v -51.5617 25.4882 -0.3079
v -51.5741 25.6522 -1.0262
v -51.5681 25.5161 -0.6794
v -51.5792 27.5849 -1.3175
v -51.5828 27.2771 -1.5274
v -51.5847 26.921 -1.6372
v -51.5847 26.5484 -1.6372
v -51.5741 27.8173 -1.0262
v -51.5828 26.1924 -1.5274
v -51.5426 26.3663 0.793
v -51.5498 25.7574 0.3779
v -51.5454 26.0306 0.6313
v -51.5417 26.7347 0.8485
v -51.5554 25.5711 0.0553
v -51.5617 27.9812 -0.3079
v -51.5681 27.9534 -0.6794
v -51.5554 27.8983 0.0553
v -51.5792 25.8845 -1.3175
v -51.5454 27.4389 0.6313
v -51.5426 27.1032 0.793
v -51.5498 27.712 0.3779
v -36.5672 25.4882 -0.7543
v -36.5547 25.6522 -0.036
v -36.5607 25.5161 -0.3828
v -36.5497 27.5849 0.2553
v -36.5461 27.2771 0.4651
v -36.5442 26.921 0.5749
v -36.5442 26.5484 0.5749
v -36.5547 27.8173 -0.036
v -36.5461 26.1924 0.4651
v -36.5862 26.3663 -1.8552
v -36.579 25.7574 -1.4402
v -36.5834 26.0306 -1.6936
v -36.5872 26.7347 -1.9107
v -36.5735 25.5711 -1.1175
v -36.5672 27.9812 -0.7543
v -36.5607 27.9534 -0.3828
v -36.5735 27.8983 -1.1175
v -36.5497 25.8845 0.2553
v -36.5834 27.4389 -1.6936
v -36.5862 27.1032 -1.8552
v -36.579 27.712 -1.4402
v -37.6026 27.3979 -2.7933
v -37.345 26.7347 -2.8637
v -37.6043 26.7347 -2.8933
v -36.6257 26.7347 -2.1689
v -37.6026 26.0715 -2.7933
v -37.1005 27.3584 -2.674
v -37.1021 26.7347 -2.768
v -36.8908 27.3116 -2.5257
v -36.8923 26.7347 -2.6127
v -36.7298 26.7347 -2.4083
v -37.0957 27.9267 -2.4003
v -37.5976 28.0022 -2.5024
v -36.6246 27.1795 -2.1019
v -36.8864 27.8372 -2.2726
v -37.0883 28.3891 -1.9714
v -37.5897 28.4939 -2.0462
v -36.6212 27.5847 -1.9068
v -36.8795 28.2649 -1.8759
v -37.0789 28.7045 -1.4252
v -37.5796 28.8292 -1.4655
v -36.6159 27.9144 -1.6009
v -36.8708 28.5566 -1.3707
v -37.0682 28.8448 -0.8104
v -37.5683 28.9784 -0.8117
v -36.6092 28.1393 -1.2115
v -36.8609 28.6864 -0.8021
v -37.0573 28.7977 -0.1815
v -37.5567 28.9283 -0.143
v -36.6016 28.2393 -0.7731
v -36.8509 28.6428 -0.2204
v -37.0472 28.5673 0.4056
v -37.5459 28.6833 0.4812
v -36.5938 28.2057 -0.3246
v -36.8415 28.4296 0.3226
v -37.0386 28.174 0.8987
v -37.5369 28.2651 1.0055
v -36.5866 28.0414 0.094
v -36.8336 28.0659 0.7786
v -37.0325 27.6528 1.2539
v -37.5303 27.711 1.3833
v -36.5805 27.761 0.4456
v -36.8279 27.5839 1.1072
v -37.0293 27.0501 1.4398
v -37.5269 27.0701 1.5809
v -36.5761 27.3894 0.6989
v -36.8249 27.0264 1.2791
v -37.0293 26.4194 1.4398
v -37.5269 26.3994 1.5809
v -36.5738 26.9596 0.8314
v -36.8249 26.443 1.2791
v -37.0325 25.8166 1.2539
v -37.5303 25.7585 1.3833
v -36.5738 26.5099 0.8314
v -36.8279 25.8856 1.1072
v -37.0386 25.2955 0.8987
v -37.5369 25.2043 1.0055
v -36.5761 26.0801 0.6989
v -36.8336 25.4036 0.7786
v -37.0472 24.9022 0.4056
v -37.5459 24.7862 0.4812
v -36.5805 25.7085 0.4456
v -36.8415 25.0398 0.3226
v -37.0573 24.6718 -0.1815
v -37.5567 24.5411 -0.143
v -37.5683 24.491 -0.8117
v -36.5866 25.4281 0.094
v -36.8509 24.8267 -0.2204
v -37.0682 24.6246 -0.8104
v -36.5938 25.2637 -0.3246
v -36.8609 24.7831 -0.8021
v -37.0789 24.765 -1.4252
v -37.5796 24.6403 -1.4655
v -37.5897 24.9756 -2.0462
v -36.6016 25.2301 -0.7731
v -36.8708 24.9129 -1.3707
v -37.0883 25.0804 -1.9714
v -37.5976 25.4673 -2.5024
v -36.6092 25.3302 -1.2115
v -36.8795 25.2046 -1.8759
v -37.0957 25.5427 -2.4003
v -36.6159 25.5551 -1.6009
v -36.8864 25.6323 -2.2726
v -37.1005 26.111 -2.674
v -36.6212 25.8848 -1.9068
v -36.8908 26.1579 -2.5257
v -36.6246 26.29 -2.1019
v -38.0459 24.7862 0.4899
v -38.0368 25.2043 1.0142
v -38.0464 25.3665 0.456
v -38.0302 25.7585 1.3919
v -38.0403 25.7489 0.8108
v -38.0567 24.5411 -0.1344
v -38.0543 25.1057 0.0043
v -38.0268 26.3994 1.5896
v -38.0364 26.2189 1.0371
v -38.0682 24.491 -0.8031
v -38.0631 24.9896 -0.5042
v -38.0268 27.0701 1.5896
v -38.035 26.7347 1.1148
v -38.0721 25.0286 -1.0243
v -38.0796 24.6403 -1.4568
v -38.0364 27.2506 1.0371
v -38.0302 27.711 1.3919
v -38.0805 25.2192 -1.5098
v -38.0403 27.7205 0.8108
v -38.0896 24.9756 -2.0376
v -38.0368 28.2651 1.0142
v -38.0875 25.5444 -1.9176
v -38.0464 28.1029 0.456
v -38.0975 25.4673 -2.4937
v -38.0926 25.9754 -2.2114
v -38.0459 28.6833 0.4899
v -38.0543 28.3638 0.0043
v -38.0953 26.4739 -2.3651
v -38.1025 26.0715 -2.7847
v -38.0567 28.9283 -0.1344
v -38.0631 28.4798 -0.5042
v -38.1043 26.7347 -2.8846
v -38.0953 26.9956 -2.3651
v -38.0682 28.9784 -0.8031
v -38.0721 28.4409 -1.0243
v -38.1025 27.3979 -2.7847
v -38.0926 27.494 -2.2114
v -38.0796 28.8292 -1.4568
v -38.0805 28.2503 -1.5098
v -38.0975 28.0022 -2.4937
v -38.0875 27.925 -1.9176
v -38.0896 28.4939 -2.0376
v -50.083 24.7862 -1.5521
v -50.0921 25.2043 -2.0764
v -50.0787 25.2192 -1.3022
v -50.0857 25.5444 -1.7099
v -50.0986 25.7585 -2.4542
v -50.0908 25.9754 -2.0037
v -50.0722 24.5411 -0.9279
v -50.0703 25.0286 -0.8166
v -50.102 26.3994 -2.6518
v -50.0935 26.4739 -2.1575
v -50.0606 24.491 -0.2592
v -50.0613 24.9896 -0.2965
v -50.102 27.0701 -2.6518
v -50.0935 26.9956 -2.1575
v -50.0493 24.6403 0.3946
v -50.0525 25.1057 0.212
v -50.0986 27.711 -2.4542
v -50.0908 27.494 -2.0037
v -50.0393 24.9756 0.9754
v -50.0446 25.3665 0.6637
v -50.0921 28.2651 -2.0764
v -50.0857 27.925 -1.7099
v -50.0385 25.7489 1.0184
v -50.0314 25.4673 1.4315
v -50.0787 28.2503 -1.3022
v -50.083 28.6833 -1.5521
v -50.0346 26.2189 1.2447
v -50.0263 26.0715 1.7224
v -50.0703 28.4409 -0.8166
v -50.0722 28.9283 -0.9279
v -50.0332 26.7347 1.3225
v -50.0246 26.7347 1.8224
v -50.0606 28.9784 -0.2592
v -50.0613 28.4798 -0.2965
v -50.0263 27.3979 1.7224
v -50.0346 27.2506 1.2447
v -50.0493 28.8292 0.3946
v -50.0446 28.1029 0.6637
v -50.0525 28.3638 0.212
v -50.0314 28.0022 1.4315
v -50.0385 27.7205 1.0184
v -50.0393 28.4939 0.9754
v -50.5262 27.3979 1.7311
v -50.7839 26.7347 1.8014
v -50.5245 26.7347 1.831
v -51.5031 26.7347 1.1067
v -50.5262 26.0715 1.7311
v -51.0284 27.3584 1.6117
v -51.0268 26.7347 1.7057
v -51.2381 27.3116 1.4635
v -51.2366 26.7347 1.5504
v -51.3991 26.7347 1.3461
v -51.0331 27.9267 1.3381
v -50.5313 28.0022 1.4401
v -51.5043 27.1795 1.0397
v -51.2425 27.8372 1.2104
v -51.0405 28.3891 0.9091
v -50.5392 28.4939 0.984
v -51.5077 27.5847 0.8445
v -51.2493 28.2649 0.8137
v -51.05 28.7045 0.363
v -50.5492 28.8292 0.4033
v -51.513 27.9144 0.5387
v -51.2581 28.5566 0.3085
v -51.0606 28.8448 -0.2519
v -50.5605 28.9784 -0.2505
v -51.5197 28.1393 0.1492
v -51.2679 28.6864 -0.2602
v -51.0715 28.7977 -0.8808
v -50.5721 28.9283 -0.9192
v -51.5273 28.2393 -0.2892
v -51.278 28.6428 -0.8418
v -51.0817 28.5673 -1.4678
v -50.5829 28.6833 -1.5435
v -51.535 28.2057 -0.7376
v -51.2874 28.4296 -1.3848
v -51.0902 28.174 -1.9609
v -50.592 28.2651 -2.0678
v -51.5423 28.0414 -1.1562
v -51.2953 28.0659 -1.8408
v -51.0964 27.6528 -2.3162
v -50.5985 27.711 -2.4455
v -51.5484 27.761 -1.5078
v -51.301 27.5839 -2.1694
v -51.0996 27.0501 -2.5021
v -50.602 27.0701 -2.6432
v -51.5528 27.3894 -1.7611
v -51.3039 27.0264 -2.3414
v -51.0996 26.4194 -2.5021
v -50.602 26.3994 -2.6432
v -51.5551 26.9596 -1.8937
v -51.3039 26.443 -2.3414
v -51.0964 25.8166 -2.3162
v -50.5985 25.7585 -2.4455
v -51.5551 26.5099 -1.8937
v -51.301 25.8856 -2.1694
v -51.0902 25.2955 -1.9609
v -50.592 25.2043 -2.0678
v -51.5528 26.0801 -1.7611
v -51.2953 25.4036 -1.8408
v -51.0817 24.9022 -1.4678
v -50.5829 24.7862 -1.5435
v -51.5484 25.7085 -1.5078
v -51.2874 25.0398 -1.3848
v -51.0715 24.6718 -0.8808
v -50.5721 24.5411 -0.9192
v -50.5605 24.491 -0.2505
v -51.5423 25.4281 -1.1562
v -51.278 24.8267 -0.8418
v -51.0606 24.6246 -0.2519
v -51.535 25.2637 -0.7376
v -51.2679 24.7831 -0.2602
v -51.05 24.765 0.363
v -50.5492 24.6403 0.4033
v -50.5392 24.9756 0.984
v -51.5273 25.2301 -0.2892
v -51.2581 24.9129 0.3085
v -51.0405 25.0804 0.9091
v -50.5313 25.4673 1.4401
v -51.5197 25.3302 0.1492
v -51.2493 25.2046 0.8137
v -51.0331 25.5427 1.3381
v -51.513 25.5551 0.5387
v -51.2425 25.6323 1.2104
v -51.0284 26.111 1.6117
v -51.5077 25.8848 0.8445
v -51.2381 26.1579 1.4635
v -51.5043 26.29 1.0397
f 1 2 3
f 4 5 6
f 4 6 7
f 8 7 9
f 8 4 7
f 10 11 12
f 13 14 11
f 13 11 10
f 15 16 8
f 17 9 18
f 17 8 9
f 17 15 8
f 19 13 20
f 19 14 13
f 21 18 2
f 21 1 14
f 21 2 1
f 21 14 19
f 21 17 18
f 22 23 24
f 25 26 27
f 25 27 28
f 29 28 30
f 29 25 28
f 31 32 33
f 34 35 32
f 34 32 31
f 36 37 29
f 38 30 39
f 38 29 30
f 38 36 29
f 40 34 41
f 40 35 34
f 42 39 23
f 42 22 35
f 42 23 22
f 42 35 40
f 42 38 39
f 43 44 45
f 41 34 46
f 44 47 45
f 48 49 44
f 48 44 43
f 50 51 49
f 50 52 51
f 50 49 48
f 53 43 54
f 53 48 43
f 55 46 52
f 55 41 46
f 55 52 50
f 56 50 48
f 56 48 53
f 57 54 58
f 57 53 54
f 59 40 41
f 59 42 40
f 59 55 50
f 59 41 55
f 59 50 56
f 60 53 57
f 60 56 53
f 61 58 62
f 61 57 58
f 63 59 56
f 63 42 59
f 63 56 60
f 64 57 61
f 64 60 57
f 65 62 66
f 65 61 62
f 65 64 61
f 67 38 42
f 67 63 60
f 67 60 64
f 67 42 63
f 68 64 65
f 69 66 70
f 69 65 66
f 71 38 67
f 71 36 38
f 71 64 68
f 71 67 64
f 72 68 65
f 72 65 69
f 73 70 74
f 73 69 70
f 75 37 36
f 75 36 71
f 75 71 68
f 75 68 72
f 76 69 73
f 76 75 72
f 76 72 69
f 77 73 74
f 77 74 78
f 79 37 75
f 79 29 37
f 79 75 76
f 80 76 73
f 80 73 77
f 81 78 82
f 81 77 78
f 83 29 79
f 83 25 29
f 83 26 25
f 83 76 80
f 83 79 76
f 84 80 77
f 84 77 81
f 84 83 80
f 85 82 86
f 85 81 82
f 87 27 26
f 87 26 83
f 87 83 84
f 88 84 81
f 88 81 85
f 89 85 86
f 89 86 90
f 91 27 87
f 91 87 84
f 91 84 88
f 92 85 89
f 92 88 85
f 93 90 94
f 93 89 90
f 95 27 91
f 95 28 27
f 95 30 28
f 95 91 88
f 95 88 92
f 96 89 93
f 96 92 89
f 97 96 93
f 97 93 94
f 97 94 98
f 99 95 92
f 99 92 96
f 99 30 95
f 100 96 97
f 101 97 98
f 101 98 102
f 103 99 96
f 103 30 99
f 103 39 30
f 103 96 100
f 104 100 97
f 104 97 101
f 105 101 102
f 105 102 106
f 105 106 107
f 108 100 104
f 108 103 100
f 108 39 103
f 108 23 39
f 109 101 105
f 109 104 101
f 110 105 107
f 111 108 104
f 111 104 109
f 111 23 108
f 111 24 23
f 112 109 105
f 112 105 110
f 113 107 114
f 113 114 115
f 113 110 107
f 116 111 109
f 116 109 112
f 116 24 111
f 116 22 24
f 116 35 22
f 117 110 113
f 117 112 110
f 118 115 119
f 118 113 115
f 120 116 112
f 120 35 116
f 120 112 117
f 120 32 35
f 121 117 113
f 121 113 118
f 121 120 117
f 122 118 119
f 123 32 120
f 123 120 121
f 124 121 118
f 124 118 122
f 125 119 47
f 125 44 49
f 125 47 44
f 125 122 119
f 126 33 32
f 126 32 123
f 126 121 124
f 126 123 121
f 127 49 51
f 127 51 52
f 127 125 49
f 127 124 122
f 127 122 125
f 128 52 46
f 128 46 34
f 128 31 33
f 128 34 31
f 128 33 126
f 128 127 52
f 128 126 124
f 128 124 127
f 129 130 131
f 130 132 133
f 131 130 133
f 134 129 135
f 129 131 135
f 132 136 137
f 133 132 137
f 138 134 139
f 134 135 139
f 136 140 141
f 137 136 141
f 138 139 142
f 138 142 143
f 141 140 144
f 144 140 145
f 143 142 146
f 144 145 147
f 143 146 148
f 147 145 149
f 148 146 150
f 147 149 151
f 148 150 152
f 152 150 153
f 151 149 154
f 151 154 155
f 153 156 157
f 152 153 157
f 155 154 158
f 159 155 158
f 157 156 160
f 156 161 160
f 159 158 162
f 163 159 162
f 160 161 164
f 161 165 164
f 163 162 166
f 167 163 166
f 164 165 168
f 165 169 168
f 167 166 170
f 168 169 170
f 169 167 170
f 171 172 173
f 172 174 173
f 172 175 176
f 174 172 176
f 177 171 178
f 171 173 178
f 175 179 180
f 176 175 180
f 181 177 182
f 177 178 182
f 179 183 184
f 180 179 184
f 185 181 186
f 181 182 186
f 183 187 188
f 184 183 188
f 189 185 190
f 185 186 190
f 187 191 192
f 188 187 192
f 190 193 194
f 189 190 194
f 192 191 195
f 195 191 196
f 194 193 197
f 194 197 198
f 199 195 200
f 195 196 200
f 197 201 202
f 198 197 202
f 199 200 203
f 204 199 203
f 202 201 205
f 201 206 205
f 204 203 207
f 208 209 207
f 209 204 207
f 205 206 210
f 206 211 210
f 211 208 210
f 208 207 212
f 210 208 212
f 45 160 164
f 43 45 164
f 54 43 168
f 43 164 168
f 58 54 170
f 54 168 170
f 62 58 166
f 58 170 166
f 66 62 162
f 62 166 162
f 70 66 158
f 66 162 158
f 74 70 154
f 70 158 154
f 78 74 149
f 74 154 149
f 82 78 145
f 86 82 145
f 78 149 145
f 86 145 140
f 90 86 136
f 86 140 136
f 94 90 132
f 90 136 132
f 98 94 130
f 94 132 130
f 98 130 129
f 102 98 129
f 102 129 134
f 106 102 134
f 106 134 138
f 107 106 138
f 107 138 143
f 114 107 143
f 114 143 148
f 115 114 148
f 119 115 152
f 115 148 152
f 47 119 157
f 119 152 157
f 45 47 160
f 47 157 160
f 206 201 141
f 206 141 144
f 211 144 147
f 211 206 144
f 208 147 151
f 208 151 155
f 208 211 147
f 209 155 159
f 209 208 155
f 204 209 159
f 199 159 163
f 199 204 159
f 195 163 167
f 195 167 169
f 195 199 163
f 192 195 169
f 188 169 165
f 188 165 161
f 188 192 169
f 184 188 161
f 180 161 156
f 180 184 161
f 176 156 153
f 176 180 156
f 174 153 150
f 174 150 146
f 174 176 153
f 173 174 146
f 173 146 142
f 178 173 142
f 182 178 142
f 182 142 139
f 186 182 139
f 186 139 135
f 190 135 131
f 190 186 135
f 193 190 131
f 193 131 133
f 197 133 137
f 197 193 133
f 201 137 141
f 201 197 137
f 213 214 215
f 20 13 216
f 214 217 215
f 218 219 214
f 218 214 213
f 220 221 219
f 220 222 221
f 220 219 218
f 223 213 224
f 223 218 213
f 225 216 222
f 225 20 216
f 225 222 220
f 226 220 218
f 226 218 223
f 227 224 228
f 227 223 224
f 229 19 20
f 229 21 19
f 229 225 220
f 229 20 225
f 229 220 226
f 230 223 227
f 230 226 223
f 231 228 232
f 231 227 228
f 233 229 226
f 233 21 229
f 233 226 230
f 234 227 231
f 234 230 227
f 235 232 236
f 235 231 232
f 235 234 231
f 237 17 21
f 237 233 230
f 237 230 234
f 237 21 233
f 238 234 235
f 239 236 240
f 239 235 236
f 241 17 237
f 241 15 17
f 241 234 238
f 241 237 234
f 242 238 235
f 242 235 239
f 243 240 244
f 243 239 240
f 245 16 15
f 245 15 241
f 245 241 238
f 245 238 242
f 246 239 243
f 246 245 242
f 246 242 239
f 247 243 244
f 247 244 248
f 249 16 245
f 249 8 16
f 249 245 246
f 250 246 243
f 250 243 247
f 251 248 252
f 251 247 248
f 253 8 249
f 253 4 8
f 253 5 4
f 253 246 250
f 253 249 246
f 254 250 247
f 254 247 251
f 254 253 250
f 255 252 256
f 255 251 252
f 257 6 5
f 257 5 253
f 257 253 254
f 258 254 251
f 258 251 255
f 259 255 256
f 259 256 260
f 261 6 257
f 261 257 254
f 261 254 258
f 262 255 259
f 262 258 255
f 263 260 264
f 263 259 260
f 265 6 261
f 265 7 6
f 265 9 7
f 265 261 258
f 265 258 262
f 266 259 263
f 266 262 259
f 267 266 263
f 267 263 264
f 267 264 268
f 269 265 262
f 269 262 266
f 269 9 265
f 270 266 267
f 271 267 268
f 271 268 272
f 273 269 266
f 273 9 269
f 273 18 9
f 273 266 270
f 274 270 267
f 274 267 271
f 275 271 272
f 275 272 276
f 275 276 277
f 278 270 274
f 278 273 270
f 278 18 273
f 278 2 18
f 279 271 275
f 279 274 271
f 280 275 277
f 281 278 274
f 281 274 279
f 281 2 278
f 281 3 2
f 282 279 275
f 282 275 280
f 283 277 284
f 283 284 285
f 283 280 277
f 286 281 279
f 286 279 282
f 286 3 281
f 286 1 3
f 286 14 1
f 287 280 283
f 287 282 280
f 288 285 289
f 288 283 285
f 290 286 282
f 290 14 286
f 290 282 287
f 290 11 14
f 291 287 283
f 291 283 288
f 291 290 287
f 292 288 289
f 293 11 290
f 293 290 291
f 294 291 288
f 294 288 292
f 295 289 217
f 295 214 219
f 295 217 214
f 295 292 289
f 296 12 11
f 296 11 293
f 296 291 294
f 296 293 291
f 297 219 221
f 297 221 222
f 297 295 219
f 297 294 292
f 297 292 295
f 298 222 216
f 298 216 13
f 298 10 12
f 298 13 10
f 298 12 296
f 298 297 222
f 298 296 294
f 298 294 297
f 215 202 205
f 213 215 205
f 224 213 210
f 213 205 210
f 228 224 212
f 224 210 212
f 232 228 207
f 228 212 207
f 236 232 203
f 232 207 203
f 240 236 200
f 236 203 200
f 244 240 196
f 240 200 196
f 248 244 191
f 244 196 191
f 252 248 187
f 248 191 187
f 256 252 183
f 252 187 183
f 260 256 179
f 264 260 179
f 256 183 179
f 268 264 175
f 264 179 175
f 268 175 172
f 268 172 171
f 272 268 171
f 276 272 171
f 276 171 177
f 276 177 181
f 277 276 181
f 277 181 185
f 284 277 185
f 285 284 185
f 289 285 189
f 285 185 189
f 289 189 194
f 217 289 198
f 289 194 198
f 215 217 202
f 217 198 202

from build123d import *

# Parameters (mm, degrees)
SKETCH1_R           = 1.75
BOSS_EXTRUDE1_DEPTH = 12
SKETCH2_R           = 2.25
BOSS_EXTRUDE2_DEPTH = 1.5
SKETCH3_R           = 2.25
BOSS_EXTRUDE3_DEPTH = 1.5
FILLET1_R           = 1


with BuildPart() as part:
    # Sketch1 → Boss-Extrude1 (new body)
    with BuildSketch(Plane(origin=(-50.041144534, 0, 0.866108158), x_dir=(0.017305329, 0, 0.999850252), z_dir=(-0.999850252, 0, 0.017305329))):
        with Locations((-1.293587728, 26.734731136)):
            Circle(SKETCH1_R)
    extrude(amount=-BOSS_EXTRUDE1_DEPTH)

    # Sketch2 → Boss-Extrude2 (add)
    with BuildSketch(Plane(origin=(-50.041144534, 0, 0.866108158), x_dir=(0.017305329, 0, 0.999850252), z_dir=(-0.999850252, 0, 0.017305329))):
        with Locations((-1.293587728, 26.734731136)):
            Circle(SKETCH2_R)
    extrude(amount=BOSS_EXTRUDE2_DEPTH)

    # Sketch3 → Boss-Extrude3 (add)
    with BuildSketch(Plane(origin=(-38.042941515, 0, 0.658444213), x_dir=(-0.017305329, 0, -0.999850252), z_dir=(0.999850252, 0, -0.017305329))):
        with Locations((1.293587728, 26.734731136)):
            Circle(SKETCH3_R)
    extrude(amount=BOSS_EXTRUDE3_DEPTH)

    # Fillet1
    fillet1_edges = [part.edges().sort_by_distance(p)[0] for p in [
        (-51.602242862, 26.734731136, -2.65099093),
        (-36.526615108, 26.734731136, 1.58875527),
    ]]
    fillet(fillet1_edges, radius=FILLET1_R)


solid = part.part
